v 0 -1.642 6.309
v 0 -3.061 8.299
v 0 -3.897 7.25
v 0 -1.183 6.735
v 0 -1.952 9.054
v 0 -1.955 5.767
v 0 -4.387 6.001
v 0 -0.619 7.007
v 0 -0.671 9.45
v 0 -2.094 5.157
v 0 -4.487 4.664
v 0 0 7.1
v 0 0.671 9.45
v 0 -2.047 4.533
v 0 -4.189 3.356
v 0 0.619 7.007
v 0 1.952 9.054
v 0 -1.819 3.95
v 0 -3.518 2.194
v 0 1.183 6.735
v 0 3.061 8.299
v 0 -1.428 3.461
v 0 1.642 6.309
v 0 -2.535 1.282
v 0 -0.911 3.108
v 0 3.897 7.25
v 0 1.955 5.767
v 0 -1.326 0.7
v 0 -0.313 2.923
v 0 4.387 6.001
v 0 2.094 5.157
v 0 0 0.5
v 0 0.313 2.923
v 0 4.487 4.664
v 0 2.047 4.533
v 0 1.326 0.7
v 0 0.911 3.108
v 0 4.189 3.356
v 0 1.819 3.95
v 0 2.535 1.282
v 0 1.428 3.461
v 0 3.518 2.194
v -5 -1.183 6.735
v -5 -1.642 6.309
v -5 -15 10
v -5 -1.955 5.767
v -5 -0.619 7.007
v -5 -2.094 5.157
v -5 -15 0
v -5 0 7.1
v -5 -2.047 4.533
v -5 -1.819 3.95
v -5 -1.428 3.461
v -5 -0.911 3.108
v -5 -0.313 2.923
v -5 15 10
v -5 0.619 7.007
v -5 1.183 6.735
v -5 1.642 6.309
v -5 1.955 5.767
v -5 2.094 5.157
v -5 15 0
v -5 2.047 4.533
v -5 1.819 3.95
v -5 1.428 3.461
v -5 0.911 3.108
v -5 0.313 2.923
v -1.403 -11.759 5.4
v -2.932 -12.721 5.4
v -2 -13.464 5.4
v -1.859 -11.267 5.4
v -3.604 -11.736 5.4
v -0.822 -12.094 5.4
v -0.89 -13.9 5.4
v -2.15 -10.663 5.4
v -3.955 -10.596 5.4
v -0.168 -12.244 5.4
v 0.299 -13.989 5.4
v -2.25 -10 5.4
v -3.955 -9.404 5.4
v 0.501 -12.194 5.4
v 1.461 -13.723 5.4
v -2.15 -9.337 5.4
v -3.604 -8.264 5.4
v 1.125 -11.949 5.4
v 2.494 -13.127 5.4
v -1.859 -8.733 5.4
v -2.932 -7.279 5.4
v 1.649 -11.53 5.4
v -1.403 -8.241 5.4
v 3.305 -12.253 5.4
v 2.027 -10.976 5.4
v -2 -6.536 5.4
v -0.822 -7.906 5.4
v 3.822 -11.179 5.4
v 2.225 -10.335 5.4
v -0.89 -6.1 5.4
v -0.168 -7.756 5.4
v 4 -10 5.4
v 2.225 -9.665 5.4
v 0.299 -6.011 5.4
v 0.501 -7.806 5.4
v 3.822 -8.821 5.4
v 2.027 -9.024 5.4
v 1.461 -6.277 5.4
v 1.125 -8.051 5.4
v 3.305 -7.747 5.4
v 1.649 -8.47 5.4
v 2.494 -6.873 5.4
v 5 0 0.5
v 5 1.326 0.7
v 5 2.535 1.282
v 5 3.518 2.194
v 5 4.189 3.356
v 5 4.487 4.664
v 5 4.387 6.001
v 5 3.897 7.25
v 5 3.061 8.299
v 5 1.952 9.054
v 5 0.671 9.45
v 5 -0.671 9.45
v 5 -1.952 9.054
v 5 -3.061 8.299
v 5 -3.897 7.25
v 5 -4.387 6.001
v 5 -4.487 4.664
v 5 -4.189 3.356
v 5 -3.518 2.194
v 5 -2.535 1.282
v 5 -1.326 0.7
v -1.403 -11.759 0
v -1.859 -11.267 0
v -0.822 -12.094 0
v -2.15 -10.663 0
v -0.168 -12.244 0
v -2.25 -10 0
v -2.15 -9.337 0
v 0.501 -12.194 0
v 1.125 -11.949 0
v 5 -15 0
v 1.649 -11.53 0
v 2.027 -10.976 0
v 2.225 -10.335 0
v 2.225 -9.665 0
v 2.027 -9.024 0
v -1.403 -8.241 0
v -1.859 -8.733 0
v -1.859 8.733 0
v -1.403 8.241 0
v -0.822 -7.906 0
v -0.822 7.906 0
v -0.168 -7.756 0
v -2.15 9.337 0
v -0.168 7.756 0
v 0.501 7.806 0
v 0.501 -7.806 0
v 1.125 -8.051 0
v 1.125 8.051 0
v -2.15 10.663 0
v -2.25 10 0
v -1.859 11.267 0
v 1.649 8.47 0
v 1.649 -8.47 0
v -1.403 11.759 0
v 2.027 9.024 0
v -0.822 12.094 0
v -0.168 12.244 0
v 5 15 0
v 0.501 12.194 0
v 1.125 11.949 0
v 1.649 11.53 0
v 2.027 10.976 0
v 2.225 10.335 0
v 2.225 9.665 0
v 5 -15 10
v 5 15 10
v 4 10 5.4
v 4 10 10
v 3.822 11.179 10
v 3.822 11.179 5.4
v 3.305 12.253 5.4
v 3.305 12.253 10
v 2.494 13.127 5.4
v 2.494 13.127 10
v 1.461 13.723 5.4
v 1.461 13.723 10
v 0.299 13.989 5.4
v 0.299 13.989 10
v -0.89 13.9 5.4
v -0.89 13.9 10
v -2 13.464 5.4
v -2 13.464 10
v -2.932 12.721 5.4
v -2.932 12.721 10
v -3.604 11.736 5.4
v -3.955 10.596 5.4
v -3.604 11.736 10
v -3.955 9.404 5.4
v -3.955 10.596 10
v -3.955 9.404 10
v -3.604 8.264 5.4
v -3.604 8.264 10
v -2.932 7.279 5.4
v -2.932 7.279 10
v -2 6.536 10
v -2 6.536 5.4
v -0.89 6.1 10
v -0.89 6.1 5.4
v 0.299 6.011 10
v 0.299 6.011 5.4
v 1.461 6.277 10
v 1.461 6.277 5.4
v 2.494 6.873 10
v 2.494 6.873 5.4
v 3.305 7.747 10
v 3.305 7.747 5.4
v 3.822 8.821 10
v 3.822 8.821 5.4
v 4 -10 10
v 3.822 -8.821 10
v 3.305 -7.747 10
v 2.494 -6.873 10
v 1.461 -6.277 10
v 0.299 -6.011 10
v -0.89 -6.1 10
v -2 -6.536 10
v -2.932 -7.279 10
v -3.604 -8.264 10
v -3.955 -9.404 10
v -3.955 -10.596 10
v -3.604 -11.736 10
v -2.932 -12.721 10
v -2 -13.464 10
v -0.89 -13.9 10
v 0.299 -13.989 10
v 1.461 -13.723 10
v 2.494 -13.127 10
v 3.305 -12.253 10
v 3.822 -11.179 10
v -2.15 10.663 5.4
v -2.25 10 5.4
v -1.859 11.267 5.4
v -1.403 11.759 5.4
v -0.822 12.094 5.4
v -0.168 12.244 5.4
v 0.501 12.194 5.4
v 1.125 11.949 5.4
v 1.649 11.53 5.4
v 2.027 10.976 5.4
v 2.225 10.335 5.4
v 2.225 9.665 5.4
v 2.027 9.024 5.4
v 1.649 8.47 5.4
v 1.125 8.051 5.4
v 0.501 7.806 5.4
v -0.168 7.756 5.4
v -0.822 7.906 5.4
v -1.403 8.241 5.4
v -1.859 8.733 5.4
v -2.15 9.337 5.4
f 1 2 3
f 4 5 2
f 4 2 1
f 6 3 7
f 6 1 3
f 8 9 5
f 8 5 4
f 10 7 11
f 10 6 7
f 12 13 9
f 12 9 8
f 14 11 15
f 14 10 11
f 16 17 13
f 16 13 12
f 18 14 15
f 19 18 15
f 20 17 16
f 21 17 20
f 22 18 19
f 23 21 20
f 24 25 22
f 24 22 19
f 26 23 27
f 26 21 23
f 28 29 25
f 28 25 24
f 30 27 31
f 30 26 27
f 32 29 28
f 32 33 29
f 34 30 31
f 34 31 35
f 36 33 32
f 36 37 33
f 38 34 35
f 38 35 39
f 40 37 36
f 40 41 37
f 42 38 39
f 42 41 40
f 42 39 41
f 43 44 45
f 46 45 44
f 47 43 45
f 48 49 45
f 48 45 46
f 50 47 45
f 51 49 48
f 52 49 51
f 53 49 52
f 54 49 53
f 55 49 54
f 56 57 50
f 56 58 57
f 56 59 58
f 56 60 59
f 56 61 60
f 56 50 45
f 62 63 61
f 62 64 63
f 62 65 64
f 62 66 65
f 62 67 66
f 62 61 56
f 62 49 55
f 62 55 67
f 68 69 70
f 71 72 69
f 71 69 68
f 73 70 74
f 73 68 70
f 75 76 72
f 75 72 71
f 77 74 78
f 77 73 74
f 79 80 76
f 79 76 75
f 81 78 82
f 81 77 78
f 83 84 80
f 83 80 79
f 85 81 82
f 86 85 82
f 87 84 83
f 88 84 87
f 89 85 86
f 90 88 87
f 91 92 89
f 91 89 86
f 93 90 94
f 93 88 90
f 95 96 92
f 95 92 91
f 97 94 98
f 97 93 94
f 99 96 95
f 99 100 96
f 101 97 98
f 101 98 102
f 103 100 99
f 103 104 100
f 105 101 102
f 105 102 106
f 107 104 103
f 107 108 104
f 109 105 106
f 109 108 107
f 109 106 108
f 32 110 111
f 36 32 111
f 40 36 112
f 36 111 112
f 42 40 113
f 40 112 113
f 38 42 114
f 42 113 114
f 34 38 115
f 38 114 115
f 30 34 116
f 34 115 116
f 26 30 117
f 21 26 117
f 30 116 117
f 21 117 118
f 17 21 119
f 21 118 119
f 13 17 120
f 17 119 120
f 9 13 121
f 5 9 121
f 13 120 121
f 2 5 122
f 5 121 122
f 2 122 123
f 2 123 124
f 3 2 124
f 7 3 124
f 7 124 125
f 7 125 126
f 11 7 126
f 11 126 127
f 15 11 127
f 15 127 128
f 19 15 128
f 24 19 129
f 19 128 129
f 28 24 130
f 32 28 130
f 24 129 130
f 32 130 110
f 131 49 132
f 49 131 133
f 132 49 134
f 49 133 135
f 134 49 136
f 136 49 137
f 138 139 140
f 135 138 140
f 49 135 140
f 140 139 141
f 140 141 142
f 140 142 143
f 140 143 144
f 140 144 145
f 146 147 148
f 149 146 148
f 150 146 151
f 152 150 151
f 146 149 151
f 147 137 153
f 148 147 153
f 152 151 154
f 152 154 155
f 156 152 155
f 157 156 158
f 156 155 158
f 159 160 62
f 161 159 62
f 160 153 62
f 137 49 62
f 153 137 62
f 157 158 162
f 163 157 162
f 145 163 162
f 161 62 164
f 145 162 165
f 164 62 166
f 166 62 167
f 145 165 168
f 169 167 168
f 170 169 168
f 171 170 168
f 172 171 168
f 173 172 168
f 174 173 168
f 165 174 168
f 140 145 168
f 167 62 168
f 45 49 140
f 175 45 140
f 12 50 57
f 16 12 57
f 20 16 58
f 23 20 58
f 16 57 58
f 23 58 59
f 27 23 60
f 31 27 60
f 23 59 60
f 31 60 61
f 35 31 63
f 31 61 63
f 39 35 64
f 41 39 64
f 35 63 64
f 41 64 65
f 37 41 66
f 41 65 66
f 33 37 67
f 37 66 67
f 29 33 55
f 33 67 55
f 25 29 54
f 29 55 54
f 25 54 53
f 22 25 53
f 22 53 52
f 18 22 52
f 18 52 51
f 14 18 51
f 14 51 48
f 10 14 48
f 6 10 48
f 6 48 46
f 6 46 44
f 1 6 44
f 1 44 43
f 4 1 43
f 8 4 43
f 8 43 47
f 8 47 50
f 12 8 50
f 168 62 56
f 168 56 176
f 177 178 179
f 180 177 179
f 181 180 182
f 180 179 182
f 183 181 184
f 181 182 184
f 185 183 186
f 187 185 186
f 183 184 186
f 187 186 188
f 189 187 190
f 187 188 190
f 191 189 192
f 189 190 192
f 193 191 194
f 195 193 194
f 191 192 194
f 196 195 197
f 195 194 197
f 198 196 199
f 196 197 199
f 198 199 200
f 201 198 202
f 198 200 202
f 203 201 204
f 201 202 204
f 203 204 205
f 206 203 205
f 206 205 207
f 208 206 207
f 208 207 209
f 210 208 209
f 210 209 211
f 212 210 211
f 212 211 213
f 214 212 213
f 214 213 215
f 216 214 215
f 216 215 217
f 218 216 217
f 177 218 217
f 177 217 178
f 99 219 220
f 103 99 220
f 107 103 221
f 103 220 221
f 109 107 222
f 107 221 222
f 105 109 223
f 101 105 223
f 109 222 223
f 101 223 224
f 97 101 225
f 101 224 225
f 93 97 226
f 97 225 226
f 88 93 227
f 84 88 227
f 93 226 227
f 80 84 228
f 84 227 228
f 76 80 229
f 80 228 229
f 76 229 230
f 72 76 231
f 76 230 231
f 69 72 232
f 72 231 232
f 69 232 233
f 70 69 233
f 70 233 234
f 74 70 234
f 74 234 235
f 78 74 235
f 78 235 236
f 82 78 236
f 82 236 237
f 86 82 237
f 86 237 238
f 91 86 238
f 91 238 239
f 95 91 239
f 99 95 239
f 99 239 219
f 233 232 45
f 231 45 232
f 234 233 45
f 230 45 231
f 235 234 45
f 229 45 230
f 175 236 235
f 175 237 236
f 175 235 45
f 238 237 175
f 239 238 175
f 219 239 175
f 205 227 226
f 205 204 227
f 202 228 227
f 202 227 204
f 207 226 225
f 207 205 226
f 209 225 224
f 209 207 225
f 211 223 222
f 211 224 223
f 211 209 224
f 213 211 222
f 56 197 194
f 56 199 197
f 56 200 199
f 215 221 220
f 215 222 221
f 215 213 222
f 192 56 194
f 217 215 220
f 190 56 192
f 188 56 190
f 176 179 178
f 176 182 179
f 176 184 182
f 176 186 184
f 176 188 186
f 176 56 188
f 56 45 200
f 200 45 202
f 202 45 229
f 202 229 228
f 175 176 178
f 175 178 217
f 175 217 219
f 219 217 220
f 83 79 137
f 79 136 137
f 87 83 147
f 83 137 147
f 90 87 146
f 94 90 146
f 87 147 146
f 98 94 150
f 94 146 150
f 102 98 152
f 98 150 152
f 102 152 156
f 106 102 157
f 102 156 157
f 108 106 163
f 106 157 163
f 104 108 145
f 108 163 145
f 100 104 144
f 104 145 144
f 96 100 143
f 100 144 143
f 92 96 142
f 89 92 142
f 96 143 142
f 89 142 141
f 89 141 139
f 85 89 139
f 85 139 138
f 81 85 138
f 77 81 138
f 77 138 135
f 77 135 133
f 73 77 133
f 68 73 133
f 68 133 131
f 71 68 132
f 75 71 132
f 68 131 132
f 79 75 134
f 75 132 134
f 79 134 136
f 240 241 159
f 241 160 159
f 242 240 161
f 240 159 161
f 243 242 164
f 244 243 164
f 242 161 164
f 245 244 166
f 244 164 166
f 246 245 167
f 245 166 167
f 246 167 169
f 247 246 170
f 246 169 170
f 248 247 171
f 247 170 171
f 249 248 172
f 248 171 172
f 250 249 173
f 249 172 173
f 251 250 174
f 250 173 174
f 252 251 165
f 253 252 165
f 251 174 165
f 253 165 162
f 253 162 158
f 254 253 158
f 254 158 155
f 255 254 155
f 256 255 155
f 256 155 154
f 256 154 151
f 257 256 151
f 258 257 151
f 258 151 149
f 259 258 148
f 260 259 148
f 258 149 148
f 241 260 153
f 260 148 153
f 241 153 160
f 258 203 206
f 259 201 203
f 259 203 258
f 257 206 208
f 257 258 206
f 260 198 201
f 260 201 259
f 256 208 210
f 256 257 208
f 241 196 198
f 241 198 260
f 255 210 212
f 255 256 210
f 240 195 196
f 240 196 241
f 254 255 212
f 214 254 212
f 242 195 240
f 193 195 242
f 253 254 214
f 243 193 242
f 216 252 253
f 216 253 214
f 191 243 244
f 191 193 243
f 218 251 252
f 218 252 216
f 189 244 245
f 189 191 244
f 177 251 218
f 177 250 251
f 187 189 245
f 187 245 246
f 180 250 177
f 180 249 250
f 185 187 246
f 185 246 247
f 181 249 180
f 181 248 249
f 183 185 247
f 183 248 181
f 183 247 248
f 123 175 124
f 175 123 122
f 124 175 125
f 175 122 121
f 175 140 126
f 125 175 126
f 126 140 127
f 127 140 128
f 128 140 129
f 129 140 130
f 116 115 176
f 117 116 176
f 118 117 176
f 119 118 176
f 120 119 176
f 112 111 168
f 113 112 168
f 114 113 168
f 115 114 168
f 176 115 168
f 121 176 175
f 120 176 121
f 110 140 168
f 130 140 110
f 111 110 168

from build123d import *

# Parameters (mm, degrees)
SKETCH_1_W                = 10
SKETCH_1_H                = 30
EXTRUDE_1_DEPTH           = 10
HOLE_WIZARD_1_D           = 4.5
HOLE_WIZARD_1_CBORE_D     = 8
HOLE_WIZARD_1_CBORE_DEPTH = 4.6
HOLE_WIZARD_M5_1_D        = 4.2
SKETCH_6_R                = 4.5
CUT_EXTRUDE_1_DEPTH       = 5


with BuildPart() as part:
    # 草图1 → 凸台-拉伸1 (new body)
    with BuildSketch(Plane.XY):
        Rectangle(SKETCH_1_W, SKETCH_1_H)
    extrude(amount=EXTRUDE_1_DEPTH)

    # 打孔尺寸(%根据)内六角圆柱头螺钉的类型1 (through all)
    with Locations(Plane.XY.offset(10)):
        with Locations((0, 10), (0, -10)):
            CounterBoreHole(HOLE_WIZARD_1_D / 2, HOLE_WIZARD_1_CBORE_D / 2, HOLE_WIZARD_1_CBORE_DEPTH)

    # M5 螺纹孔1 (through all)
    with Locations(Plane(origin=(5, 0, 0), x_dir=(0, 0, -1), z_dir=(1, 0, 0))):
        with Locations((-5, 0)):
            Hole(HOLE_WIZARD_M5_1_D / 2)

    # 草图6 → 切除-拉伸1 (cut)
    with BuildSketch(Plane(origin=(5, 0, 0), x_dir=(0, 0, -1), z_dir=(1, 0, 0))):
        with Locations((-5, 0)):
            Circle(SKETCH_6_R)
    extrude(amount=-CUT_EXTRUDE_1_DEPTH, mode=Mode.SUBTRACT)


solid = part.part
